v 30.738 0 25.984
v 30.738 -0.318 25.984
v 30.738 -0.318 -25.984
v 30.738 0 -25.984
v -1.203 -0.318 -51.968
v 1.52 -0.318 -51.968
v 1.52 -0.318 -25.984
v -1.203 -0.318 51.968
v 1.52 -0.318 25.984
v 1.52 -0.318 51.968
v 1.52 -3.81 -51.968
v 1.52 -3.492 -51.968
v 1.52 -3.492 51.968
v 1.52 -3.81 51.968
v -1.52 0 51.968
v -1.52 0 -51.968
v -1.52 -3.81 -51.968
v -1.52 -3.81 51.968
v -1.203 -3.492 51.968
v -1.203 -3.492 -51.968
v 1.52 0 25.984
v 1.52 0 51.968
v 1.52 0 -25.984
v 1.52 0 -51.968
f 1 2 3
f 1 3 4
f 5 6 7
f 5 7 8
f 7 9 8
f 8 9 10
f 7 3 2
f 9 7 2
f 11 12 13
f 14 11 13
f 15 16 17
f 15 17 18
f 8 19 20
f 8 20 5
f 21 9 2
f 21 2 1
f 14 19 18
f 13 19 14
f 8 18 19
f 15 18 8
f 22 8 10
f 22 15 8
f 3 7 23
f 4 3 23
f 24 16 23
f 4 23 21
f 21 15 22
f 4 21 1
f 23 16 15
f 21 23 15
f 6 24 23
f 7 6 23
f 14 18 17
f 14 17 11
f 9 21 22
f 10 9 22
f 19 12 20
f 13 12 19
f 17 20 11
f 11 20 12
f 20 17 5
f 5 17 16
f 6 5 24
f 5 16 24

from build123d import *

# Parameters (mm, degrees)
F0_W     = 3.04038
F0_H     = 103.9368
F1_DEPTH = 3.81
F2_W     = 3.175
F2_H     = 103.9368
F3_DEPTH = 2.72288
F4_W     = 0.3175
F4_H     = 51.9684
F5_DEPTH = 29.21762


with BuildPart() as f1:
    # F0 (on Front) → F1 (new body)
    with BuildSketch(Plane.XZ):
        Rectangle(F0_W, F0_H)
    extrude(amount=F1_DEPTH)

    # F2 (on face) → F3 (cut)
    with BuildSketch(Plane.YZ.offset(1.52019)):
        with Locations((-1.905, 0)):
            Rectangle(F2_W, F2_H)
    extrude(amount=-F3_DEPTH, mode=Mode.SUBTRACT)

    # F4 (on face) → F5 (join)
    with BuildSketch(Plane.YZ.offset(1.52019)):
        with Locations((-0.15875, 0)):
            Rectangle(F4_W, F4_H)
    extrude(amount=F5_DEPTH)


solid = f1.part
